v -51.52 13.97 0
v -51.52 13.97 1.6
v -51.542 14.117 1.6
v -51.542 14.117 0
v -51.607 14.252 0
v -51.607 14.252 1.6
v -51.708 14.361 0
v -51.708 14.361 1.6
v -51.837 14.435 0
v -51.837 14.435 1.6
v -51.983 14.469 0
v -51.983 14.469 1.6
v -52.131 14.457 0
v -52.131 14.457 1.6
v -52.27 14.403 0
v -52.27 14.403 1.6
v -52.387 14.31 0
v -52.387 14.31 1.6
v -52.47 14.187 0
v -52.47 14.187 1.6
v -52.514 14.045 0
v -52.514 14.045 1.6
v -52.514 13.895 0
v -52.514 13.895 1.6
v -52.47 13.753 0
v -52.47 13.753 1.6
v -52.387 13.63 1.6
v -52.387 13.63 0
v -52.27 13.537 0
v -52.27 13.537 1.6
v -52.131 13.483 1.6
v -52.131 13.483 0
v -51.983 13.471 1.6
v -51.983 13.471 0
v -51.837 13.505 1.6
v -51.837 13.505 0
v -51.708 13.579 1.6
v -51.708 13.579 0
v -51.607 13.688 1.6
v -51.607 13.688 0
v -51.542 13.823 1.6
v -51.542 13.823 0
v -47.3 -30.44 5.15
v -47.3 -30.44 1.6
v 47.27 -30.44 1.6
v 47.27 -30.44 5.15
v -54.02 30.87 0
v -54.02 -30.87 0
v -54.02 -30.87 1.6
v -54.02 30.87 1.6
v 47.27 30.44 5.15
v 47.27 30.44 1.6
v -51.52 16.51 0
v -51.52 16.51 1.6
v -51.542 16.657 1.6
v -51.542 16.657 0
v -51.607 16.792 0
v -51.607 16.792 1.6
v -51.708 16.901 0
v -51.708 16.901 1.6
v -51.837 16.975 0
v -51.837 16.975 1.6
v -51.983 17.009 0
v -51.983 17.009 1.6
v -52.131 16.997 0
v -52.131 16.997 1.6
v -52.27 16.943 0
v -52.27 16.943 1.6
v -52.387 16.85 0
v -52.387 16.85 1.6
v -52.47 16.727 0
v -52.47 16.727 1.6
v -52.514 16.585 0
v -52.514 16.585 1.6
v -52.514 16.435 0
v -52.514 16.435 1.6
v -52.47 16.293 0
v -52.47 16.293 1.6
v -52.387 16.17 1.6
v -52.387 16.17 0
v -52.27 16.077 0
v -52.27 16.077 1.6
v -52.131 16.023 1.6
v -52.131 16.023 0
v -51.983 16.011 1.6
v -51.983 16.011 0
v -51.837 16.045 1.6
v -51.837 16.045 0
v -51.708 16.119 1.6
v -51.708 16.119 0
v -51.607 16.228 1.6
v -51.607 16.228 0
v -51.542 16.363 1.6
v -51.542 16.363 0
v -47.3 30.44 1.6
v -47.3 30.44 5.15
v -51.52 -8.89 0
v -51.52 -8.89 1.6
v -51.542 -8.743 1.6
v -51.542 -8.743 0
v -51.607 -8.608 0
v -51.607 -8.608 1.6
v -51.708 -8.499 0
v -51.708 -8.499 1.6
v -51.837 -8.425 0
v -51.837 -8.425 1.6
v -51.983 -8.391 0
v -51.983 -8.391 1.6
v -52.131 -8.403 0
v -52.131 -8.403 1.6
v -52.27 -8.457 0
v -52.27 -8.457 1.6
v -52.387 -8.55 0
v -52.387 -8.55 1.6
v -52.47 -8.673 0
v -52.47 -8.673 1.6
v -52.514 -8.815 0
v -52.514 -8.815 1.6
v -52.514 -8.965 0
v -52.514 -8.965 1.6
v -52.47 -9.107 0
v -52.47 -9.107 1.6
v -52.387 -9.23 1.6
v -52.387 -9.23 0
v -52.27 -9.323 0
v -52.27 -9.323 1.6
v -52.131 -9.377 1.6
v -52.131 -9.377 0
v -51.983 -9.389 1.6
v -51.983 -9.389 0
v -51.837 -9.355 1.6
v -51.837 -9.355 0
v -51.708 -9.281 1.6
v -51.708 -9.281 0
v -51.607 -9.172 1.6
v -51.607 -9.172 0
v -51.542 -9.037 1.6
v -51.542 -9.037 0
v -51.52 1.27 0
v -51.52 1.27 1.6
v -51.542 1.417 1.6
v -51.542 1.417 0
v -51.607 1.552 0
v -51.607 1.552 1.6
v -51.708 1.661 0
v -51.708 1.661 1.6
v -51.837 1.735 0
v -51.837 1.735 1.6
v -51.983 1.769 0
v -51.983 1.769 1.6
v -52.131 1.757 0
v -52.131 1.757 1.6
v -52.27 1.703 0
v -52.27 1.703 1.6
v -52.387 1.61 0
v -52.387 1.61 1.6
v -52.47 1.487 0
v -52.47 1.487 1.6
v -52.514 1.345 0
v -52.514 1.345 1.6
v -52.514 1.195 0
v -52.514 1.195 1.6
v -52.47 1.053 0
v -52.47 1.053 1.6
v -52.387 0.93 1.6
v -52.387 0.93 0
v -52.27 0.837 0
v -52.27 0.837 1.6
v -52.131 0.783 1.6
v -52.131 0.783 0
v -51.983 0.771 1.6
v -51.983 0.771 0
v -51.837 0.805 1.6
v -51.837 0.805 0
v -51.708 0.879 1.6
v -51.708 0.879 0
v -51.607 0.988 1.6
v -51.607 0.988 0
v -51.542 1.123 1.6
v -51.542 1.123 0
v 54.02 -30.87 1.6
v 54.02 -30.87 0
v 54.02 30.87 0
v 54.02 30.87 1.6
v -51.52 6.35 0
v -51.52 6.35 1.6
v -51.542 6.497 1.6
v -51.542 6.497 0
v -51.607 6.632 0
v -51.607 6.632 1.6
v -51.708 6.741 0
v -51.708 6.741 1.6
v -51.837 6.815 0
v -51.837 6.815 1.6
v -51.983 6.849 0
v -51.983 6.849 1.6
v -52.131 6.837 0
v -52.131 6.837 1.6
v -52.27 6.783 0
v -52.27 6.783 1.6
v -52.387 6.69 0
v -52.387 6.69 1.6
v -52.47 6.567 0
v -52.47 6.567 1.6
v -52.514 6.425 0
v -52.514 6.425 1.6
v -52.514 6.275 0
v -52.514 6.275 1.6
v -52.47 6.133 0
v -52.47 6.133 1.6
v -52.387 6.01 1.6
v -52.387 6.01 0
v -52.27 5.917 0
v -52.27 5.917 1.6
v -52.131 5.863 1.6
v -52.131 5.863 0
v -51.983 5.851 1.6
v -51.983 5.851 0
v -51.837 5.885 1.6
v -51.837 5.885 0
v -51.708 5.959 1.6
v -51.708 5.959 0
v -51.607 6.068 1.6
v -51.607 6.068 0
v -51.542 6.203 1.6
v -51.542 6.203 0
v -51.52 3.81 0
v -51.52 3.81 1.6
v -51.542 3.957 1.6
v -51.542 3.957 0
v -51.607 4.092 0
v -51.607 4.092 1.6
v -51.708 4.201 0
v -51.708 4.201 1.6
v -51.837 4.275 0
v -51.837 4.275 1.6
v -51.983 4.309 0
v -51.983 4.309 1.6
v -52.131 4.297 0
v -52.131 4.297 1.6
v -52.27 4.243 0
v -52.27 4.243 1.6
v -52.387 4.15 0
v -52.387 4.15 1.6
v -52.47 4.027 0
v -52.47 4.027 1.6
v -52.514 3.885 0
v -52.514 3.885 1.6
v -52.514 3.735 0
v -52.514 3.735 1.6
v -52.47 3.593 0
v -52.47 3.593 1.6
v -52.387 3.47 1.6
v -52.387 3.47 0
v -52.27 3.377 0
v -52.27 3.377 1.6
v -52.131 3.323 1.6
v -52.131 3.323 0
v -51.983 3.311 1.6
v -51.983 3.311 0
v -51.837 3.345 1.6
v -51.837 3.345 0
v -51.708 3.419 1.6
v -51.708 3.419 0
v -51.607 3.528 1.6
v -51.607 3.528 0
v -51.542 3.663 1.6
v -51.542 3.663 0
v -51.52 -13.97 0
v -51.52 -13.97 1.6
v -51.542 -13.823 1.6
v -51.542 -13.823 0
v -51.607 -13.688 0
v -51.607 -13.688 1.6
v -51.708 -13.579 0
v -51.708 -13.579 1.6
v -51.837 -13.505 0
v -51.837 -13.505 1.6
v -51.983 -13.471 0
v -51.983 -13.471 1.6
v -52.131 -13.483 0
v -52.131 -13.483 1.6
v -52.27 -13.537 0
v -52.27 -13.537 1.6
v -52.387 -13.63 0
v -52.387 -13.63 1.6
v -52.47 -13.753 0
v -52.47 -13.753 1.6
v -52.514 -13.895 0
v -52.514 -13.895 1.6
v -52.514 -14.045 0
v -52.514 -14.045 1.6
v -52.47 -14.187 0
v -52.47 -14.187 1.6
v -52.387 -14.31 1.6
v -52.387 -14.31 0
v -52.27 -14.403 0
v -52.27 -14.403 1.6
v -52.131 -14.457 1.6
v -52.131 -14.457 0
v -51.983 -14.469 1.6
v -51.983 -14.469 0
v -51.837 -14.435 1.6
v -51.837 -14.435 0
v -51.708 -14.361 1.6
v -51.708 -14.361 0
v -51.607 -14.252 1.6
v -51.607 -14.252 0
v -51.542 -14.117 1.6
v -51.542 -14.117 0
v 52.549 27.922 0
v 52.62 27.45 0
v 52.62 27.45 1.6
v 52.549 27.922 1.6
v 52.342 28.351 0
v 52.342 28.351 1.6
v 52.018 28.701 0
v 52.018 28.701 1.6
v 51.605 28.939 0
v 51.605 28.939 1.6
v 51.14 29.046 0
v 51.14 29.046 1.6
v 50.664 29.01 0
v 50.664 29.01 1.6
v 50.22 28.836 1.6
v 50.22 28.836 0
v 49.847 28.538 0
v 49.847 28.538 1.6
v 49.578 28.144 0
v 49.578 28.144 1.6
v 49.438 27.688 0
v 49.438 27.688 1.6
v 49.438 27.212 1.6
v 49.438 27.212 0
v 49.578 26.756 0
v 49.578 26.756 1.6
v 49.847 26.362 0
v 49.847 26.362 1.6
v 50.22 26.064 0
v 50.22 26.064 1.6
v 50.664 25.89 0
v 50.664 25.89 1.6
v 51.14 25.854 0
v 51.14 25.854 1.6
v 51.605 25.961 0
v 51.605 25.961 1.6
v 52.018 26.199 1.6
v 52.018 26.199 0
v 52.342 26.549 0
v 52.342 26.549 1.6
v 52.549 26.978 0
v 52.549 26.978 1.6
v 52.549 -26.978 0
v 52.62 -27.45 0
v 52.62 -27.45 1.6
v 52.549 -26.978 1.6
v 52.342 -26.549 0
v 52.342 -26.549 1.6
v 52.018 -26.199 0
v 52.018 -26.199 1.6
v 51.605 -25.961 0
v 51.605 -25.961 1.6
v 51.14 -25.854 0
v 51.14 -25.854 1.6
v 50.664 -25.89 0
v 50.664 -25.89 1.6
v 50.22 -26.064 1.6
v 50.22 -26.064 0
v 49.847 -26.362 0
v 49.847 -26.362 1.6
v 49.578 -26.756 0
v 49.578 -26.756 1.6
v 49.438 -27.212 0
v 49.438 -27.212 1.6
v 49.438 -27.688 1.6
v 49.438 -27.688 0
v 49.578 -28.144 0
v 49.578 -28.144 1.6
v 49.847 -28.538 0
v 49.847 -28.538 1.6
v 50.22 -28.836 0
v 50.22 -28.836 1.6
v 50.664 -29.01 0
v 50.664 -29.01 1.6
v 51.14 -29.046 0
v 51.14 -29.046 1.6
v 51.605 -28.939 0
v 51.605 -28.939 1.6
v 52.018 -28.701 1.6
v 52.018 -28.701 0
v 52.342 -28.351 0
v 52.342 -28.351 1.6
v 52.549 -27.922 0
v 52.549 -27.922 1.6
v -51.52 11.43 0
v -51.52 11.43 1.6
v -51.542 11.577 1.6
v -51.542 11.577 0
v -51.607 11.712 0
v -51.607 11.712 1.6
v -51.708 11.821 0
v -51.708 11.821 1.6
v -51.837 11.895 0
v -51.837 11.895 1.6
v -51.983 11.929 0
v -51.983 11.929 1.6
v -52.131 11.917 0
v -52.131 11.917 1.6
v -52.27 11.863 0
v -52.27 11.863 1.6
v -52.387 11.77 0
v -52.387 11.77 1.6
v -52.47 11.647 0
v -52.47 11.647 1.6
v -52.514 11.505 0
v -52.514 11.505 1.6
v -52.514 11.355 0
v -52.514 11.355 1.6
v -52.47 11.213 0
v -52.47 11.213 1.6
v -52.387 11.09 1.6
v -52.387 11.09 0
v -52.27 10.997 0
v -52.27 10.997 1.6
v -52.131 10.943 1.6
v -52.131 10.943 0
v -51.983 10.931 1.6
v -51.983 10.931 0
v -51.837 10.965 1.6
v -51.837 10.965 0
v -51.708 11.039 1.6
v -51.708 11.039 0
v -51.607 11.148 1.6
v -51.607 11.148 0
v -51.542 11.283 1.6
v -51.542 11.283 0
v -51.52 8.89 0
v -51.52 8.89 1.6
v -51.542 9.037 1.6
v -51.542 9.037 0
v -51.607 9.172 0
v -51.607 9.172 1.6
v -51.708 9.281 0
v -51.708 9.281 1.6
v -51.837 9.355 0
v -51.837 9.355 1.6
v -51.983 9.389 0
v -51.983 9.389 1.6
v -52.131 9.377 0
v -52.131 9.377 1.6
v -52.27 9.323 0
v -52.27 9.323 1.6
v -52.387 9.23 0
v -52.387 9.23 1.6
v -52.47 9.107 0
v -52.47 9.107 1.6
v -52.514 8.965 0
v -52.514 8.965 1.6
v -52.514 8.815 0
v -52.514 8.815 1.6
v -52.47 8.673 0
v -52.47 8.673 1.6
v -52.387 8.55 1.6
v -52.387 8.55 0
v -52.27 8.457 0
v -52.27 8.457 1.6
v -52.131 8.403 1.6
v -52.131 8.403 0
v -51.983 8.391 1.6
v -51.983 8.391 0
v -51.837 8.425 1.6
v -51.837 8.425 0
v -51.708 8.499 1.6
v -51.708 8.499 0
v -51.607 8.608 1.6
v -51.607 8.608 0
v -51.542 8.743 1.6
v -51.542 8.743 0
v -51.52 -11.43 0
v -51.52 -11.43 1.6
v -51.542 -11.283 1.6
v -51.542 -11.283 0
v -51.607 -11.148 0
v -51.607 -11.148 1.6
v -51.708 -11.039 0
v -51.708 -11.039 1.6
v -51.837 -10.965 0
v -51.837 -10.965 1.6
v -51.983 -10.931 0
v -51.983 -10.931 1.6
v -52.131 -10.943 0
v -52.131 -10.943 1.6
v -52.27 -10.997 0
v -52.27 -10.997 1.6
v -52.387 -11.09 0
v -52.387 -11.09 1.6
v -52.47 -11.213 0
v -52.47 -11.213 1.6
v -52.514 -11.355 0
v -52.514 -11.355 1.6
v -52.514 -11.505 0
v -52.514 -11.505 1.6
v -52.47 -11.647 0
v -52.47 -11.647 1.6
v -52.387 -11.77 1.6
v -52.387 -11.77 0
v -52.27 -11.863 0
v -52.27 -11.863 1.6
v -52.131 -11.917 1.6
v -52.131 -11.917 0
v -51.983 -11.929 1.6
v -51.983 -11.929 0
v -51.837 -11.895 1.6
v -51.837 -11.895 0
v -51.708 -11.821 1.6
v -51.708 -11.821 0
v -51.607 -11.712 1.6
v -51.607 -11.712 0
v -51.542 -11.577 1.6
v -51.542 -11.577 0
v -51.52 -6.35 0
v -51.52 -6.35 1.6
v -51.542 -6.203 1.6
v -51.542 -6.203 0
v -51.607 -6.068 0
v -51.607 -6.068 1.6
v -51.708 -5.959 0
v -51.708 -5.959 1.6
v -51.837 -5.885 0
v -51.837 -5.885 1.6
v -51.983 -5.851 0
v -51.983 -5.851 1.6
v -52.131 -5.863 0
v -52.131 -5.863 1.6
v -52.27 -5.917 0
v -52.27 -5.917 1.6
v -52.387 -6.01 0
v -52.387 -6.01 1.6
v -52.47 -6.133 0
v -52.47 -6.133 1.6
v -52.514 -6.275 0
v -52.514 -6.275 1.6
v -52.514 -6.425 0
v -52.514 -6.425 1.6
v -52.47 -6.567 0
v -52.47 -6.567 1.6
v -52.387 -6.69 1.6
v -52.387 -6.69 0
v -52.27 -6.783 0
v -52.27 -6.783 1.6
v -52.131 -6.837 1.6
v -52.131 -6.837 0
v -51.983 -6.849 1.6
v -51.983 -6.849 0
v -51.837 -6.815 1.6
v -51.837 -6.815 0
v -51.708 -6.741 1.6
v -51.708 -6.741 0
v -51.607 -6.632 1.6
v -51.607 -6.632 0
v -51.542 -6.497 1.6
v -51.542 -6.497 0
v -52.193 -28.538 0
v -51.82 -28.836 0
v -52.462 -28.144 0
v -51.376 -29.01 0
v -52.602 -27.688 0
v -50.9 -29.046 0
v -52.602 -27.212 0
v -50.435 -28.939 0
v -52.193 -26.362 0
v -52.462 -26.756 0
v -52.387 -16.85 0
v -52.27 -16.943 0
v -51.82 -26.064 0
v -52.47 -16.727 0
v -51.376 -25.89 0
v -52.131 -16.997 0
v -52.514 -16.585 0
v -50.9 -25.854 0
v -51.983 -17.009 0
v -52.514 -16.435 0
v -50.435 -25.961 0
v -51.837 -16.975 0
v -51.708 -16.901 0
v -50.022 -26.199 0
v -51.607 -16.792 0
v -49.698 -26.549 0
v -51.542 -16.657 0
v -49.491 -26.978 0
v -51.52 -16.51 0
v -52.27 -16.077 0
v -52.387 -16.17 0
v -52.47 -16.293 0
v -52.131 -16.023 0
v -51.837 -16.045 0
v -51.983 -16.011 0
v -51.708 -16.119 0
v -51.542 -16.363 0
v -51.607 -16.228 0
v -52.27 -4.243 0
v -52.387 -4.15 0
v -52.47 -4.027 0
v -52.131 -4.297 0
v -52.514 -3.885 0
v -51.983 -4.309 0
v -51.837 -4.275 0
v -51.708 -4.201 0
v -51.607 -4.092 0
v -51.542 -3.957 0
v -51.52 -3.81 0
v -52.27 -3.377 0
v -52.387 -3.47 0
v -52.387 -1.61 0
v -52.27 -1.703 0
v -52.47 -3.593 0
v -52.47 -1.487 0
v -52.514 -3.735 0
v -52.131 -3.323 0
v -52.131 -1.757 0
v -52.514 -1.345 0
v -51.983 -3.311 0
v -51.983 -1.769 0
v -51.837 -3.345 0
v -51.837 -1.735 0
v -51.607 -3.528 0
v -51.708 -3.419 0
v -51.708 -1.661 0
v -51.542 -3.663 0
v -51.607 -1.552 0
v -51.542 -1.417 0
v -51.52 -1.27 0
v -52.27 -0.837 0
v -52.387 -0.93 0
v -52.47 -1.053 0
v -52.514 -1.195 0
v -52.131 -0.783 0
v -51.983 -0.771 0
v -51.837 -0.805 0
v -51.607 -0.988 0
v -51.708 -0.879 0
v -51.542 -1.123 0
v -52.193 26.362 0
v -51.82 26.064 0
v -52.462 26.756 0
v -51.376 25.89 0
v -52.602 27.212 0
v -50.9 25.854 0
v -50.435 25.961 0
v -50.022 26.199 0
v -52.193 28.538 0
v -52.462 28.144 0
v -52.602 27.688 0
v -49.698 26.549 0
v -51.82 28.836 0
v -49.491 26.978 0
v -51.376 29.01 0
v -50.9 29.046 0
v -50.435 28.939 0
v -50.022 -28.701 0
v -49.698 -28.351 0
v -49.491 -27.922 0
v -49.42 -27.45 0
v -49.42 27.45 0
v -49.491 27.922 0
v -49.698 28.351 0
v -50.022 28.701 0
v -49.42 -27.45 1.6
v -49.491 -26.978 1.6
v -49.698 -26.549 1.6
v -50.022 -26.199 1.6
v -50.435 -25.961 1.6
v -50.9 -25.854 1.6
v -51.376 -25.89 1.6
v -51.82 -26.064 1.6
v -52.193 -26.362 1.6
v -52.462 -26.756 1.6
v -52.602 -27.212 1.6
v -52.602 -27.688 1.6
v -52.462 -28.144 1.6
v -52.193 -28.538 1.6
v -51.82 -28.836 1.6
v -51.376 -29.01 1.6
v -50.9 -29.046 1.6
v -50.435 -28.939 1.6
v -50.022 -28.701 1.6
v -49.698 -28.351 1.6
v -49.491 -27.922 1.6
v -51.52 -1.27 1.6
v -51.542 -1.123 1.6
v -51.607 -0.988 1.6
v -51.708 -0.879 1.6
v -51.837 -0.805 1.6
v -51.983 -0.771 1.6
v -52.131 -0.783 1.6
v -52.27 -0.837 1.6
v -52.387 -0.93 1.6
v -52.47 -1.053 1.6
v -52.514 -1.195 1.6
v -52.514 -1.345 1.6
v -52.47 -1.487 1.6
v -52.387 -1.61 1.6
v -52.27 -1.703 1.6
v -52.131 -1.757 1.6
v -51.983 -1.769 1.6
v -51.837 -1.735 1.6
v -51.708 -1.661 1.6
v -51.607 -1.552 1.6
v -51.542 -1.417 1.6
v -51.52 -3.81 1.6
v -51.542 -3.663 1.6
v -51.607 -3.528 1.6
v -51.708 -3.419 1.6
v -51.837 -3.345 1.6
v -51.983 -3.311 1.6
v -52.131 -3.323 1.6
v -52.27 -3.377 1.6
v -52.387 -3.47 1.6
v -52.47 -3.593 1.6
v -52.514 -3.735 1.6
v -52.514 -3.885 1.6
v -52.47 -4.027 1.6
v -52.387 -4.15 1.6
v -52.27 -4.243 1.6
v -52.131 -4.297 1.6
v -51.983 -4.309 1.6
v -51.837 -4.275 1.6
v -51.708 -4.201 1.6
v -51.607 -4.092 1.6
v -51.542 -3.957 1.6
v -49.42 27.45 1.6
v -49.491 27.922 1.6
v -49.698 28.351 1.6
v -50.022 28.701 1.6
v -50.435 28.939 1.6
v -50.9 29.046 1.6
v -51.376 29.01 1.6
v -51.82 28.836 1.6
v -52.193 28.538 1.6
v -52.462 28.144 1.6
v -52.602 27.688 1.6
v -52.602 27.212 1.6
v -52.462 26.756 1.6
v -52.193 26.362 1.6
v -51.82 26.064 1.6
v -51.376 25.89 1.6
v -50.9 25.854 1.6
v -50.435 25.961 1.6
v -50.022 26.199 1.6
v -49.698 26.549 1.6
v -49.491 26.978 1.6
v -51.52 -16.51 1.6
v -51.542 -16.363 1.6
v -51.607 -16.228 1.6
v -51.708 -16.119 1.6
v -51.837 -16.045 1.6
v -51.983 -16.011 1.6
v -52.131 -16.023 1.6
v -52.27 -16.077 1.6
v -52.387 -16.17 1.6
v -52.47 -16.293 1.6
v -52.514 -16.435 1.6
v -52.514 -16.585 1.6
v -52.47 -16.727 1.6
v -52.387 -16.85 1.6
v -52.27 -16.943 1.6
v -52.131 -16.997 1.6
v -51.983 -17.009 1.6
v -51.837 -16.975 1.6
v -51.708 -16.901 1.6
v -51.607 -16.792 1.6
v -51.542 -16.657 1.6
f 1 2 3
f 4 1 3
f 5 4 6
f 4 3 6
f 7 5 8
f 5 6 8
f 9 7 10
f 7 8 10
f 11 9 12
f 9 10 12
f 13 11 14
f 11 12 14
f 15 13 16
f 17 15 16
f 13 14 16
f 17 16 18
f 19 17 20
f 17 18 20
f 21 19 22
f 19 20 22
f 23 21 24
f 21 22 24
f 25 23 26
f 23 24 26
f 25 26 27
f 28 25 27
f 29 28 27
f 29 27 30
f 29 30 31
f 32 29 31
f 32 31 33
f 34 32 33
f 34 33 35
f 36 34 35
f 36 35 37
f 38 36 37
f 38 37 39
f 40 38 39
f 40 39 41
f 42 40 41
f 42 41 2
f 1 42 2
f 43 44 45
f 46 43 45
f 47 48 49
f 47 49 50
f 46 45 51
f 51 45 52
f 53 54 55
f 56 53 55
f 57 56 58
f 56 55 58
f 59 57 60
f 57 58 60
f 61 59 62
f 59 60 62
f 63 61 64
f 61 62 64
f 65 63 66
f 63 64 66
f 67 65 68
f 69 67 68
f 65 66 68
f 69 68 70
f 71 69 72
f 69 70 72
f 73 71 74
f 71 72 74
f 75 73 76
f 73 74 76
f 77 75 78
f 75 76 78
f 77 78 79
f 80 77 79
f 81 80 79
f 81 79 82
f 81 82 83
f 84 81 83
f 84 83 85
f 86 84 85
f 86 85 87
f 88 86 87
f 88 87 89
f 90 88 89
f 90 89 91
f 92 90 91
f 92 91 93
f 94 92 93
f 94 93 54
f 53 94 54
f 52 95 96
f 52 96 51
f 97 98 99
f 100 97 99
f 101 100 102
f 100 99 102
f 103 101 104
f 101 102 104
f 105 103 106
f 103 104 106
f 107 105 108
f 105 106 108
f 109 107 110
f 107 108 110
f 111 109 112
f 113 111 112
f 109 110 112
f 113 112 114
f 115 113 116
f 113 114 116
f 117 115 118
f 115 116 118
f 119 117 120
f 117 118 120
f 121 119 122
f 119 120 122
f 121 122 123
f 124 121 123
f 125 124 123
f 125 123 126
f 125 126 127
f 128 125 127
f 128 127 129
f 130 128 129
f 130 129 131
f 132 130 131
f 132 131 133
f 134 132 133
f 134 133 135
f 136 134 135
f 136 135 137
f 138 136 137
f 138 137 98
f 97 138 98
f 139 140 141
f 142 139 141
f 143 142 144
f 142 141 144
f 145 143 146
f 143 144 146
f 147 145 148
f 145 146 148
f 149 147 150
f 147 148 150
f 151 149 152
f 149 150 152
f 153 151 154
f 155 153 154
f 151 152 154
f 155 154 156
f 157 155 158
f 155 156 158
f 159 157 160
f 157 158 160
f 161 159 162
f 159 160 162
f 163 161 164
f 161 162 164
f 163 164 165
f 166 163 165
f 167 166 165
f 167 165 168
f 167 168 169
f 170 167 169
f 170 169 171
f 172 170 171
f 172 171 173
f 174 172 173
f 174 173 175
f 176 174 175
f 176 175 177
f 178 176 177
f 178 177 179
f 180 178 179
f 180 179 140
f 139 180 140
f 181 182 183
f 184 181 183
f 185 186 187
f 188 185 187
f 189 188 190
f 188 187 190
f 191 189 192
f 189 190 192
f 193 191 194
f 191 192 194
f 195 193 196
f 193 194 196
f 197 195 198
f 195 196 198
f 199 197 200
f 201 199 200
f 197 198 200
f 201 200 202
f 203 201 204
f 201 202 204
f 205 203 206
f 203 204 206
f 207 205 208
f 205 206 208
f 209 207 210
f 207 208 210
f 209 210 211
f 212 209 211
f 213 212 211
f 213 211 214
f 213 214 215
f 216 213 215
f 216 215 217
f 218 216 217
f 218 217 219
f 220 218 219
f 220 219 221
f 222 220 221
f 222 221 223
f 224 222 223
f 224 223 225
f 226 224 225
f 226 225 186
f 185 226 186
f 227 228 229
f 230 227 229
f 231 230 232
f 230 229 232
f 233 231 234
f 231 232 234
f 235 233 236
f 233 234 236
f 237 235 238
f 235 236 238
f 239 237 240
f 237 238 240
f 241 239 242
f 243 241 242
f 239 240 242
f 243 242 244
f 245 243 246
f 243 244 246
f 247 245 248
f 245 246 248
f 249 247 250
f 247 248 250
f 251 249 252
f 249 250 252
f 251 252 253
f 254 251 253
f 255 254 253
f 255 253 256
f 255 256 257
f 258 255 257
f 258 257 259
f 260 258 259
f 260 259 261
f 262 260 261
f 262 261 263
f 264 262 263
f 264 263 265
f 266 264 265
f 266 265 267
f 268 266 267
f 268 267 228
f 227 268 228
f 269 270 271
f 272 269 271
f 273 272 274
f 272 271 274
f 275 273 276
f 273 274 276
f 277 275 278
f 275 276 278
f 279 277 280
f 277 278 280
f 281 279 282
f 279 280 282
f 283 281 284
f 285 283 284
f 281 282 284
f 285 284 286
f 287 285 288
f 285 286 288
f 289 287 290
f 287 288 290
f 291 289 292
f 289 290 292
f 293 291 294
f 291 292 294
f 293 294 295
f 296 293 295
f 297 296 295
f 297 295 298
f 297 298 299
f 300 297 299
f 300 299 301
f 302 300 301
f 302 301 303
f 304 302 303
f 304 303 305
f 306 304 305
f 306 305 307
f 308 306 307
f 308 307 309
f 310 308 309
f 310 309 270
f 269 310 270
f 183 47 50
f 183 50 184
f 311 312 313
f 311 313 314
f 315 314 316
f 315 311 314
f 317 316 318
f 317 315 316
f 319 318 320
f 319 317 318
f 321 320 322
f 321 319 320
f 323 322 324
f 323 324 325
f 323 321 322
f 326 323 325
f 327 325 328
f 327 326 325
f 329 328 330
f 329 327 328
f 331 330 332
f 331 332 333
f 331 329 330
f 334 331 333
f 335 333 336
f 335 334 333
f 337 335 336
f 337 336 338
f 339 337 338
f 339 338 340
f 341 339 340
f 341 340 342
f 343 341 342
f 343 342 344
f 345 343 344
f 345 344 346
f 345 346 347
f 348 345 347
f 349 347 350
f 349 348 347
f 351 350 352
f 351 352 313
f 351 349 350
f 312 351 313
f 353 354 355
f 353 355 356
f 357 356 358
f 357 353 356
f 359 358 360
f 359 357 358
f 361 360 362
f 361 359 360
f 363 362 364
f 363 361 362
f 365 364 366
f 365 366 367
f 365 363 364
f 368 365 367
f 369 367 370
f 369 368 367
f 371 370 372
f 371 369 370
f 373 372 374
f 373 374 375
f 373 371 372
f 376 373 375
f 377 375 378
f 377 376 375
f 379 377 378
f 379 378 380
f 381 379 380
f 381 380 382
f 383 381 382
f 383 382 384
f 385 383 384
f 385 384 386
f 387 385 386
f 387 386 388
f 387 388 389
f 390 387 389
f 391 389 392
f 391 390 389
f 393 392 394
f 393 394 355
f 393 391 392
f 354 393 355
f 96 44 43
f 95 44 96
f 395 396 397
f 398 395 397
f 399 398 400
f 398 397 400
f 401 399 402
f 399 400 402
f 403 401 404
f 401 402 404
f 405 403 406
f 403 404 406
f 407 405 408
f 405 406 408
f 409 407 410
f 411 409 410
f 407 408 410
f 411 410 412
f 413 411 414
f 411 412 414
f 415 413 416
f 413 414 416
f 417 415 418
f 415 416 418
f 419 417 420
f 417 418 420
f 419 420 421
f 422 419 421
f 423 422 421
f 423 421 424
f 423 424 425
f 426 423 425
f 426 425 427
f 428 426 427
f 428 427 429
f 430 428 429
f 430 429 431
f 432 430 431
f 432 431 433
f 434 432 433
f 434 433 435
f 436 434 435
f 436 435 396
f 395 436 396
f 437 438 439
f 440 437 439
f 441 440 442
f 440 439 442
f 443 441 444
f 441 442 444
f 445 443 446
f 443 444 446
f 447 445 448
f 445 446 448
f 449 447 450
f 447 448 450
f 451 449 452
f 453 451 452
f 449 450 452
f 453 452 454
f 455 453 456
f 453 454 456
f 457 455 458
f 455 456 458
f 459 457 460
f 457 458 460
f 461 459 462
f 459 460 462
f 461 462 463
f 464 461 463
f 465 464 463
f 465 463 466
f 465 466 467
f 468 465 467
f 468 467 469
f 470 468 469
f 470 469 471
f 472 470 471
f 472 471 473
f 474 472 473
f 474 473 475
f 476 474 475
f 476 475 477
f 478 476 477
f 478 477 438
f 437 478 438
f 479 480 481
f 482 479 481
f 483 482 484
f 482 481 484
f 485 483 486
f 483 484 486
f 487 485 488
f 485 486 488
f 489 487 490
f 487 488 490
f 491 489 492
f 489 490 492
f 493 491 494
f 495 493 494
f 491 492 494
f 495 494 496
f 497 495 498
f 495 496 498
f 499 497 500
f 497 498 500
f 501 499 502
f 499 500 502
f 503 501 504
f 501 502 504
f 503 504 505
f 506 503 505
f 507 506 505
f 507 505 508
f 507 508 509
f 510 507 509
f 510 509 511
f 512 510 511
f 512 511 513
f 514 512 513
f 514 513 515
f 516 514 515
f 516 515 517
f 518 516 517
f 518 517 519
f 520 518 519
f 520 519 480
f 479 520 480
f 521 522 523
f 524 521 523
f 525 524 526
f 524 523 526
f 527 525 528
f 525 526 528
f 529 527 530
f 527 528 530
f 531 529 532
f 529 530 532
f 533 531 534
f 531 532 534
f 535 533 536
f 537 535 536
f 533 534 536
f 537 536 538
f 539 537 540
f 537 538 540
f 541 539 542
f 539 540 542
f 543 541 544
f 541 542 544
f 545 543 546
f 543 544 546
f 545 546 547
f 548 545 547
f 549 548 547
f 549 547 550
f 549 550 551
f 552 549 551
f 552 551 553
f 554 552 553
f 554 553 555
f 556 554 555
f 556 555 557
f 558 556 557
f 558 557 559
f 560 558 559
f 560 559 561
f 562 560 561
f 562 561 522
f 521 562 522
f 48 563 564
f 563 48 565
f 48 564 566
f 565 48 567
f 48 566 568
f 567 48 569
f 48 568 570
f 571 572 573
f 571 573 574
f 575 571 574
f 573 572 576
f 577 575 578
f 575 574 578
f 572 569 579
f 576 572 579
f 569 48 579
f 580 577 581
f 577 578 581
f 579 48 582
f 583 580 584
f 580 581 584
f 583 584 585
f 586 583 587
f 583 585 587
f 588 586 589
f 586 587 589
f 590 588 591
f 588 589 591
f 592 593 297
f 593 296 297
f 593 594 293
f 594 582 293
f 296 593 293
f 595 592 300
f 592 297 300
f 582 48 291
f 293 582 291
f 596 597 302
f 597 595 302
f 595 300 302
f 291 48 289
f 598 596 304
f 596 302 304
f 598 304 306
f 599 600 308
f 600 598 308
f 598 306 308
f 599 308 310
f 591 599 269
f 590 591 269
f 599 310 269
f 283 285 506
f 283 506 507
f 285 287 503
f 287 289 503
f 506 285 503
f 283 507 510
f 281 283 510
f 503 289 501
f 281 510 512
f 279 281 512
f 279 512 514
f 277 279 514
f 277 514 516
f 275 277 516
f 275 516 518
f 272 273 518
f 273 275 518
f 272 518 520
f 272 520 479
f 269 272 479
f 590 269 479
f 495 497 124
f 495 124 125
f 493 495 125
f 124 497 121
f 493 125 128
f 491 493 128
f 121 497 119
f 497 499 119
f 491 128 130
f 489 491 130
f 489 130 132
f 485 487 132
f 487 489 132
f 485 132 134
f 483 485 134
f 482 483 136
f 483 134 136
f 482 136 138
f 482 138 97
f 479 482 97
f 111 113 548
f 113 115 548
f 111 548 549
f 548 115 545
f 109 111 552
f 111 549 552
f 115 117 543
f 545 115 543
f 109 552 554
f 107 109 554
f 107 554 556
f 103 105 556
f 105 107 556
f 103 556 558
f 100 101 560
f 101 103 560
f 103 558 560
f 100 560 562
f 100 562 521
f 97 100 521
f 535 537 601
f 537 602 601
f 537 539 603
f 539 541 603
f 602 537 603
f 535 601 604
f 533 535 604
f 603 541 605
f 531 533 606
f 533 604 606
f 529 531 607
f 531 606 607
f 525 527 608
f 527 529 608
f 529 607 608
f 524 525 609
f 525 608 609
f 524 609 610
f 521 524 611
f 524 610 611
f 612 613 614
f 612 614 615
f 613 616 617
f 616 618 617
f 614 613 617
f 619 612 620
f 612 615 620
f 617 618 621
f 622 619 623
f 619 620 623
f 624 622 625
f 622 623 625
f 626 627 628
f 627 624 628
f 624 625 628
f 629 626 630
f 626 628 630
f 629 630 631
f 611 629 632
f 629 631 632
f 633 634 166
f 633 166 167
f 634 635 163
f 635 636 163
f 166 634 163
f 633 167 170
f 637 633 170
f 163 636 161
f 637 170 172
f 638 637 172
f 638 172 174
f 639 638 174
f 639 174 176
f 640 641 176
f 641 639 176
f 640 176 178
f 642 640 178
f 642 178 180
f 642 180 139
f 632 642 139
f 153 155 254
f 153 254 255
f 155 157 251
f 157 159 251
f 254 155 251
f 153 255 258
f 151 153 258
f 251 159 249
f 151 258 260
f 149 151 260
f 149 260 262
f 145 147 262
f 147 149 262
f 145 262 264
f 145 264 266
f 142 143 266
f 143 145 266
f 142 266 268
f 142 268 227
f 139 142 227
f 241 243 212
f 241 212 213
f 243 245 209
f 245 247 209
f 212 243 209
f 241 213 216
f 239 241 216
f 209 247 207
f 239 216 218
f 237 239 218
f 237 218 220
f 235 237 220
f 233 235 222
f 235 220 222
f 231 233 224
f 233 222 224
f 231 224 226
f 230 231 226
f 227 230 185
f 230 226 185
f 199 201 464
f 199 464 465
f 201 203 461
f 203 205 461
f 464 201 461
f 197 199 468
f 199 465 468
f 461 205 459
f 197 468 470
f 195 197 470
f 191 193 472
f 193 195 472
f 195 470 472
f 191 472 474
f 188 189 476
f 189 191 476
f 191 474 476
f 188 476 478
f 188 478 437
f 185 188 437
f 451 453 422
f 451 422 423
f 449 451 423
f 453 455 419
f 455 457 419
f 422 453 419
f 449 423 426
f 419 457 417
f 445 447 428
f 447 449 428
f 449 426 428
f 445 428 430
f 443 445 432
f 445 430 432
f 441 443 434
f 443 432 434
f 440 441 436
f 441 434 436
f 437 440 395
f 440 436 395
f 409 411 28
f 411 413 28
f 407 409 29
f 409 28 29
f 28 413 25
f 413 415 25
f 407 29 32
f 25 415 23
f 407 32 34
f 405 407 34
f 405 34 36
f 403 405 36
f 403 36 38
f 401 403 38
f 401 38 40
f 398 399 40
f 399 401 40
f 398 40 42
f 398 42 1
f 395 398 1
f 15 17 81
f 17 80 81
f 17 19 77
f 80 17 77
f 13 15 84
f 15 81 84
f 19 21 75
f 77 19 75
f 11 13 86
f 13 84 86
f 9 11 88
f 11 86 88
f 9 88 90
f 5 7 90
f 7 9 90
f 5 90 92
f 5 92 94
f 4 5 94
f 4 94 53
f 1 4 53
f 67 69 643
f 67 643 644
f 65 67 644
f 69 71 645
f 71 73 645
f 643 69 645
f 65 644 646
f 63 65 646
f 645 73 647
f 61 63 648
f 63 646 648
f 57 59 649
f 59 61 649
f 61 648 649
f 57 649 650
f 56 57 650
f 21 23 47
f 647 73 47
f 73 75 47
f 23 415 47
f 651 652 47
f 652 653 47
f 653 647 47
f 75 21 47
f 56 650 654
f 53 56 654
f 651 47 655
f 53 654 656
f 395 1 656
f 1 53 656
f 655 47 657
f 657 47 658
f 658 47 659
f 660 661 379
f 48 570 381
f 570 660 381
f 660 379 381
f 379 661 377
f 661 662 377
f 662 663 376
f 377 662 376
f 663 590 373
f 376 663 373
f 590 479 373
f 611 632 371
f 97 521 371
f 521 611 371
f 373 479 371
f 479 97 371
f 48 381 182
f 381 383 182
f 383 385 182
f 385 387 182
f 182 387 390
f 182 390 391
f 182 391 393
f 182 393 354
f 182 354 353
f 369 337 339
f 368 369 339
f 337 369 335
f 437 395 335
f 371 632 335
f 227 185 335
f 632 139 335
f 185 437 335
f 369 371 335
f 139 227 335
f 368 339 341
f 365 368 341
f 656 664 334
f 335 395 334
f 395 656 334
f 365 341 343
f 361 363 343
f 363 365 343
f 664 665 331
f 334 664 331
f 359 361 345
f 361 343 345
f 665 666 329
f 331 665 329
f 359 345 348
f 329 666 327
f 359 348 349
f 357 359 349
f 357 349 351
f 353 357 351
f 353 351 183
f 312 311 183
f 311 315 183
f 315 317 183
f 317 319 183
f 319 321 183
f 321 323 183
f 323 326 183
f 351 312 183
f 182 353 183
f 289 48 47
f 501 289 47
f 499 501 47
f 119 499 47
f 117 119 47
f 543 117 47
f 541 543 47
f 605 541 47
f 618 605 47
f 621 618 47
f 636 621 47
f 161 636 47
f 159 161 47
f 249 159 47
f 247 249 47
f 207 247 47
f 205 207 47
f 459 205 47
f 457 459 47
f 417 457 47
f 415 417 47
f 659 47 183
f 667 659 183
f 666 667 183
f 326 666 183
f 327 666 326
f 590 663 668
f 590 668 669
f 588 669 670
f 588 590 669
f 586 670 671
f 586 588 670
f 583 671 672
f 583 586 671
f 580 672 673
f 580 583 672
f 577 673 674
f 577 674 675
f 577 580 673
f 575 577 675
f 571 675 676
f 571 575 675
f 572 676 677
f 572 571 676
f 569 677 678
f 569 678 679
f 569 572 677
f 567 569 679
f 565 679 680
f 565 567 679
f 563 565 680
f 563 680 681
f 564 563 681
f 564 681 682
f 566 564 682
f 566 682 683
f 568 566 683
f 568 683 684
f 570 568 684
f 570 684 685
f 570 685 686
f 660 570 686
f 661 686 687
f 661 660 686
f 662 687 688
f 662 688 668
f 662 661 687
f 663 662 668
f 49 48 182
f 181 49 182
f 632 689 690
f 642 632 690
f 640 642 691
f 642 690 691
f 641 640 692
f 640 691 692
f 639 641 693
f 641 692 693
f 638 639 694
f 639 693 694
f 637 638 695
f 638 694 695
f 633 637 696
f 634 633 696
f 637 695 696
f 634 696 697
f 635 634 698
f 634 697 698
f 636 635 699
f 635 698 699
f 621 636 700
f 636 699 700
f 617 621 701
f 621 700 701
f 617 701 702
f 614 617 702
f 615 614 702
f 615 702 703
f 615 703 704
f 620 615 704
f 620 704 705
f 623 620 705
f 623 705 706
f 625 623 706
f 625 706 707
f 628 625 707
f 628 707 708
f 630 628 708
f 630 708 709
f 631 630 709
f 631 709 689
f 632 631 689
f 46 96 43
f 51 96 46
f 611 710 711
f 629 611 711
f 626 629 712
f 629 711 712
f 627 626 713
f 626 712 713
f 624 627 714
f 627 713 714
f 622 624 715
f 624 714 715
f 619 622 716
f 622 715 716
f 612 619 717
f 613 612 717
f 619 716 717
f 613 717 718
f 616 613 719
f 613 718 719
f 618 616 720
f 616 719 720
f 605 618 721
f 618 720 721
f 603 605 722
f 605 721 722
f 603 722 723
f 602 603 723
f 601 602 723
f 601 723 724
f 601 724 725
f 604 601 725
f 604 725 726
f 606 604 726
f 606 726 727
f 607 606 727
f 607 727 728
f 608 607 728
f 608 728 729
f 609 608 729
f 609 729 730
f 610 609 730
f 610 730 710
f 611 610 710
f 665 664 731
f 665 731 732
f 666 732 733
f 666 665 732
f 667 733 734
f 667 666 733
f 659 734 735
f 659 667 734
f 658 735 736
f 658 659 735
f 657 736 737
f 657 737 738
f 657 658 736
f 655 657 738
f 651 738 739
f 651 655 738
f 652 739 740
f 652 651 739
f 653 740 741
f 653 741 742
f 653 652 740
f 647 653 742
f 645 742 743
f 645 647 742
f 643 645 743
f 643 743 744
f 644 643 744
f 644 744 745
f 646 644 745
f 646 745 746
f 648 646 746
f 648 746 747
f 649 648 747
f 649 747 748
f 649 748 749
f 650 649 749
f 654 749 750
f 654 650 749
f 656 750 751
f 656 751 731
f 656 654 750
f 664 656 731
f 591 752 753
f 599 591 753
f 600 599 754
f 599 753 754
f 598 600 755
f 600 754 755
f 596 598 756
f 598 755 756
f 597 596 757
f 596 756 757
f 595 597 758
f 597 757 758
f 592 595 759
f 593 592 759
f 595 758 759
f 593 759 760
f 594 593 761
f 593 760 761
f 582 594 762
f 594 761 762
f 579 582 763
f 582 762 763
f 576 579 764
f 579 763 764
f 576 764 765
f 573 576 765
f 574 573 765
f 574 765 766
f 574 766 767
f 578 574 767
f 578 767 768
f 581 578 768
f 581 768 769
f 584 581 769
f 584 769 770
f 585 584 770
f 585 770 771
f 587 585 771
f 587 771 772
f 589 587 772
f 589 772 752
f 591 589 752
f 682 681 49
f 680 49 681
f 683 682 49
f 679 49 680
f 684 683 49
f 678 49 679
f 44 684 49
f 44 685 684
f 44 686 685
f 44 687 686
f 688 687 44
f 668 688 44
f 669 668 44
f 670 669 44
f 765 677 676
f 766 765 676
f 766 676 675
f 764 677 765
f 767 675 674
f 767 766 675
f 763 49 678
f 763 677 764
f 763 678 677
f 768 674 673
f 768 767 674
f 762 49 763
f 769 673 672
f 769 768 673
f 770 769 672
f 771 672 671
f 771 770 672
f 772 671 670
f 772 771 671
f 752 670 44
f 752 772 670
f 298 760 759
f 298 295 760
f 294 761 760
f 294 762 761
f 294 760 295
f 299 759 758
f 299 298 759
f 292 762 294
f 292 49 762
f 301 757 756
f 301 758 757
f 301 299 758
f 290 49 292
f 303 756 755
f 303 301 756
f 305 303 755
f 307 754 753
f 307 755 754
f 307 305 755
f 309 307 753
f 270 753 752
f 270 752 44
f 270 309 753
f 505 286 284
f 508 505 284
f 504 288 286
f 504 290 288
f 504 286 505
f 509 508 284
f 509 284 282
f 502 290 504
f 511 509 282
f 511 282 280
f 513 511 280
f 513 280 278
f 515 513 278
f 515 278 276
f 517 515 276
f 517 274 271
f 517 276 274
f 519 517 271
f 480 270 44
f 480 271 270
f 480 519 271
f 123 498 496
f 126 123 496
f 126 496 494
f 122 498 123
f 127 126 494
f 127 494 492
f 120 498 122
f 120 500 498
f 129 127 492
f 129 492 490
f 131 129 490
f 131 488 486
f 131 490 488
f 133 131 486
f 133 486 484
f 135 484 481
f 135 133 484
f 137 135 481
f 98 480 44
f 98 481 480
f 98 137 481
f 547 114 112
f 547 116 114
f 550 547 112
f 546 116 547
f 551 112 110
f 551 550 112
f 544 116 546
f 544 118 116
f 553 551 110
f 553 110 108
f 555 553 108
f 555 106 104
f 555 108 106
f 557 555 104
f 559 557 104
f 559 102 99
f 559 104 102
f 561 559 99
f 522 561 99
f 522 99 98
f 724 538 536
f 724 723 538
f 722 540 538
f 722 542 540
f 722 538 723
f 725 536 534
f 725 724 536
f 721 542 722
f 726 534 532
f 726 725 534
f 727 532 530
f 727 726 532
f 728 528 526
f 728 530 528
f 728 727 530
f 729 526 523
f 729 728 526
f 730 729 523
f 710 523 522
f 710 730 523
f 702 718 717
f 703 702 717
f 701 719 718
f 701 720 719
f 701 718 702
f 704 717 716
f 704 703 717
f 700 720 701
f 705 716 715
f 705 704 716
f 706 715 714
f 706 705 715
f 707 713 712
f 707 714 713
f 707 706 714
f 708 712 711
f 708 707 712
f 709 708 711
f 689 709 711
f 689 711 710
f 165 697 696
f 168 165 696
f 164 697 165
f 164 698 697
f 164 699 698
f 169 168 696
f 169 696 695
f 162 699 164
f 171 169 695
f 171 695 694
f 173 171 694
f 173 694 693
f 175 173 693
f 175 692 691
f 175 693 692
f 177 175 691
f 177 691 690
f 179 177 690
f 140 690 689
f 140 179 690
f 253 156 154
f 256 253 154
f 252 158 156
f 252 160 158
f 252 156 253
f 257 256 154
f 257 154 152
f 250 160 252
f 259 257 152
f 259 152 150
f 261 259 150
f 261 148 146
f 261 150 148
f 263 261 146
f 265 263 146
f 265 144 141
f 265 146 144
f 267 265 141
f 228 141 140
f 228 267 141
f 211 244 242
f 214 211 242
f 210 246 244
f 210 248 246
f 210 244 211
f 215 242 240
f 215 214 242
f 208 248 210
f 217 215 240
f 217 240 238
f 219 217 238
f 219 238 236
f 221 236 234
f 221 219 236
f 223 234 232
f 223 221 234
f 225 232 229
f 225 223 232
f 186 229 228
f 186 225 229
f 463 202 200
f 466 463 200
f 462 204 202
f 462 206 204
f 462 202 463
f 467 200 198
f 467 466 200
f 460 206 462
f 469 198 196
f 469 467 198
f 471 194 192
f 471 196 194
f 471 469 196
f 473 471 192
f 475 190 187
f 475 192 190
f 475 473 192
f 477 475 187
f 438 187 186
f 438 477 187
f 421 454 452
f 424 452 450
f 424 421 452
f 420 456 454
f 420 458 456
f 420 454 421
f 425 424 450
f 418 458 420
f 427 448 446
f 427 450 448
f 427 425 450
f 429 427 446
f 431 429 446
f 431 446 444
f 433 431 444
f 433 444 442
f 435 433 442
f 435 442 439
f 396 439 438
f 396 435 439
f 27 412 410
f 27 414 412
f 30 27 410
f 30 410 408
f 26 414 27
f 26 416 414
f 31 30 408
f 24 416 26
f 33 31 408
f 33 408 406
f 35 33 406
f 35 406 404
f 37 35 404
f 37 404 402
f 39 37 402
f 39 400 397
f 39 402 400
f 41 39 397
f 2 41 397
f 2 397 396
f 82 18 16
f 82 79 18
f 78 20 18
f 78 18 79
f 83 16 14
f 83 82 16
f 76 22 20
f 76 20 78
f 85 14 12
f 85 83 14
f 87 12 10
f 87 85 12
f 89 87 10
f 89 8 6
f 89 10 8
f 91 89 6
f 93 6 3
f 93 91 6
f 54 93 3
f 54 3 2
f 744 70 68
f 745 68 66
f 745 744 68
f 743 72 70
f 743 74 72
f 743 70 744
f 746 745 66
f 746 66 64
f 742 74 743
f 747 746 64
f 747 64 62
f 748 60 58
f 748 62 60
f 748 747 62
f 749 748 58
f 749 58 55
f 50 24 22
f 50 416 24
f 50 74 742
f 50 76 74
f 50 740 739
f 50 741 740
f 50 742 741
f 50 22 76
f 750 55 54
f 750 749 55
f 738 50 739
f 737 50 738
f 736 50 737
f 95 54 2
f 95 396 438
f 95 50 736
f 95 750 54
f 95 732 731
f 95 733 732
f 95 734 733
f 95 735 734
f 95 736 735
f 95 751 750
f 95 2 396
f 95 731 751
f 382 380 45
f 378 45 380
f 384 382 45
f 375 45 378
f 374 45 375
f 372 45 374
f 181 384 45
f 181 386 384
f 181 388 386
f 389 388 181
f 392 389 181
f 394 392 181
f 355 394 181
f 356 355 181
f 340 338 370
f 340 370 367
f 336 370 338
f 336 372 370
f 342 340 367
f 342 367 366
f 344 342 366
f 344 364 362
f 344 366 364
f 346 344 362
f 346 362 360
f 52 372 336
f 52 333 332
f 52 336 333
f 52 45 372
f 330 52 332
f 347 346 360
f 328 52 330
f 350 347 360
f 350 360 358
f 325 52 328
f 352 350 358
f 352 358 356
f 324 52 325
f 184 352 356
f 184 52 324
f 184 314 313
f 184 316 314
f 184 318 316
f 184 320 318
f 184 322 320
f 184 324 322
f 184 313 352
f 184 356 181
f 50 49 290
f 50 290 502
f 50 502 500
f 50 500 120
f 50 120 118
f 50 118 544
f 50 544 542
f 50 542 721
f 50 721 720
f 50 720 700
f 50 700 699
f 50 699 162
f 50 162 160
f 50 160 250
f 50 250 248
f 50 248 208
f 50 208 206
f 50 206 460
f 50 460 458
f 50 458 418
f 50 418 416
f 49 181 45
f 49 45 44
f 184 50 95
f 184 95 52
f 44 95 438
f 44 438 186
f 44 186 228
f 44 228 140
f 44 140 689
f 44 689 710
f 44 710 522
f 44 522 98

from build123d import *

# Parameters (mm, degrees)
SKETCH1_W           = 108.04
SKETCH1_H           = 61.74
SKETCH1_R           = 1.6
BOSS_EXTRUDE1_DEPTH = 1.6
SKETCH2_W           = 94.57
SKETCH2_H           = 60.88
BOSS_EXTRUDE2_DEPTH = 3.55
SKETCH3_R           = 0.5
CUT_EXTRUDE1_DEPTH  = 3.55


with BuildPart() as part:
    # Sketch1 → Boss-Extrude1 (new body)
    with BuildSketch(Plane.XY):
        Rectangle(SKETCH1_W, SKETCH1_H)
        with Locations((-51.02, 27.45)):
            Circle(SKETCH1_R, mode=Mode.SUBTRACT)
        with Locations((-51.02, -27.45)):
            Circle(SKETCH1_R, mode=Mode.SUBTRACT)
        with Locations((51.02, -27.45)):
            Circle(SKETCH1_R, mode=Mode.SUBTRACT)
        with Locations((51.02, 27.45)):
            Circle(SKETCH1_R, mode=Mode.SUBTRACT)
    extrude(amount=BOSS_EXTRUDE1_DEPTH)

    # Sketch2 → Boss-Extrude2 (add)
    with BuildSketch(Plane.XY.offset(1.6)):
        with Locations((-0.015, 0)):
            Rectangle(SKETCH2_W, SKETCH2_H)
    extrude(amount=BOSS_EXTRUDE2_DEPTH)

    # Sketch3 → Cut-Extrude1 (cut)
    with BuildSketch(Plane.XY.offset(1.6)):
        with Locations((-52.02, 16.51)):
            Circle(SKETCH3_R)
        with Locations((-52.02, 13.97)):
            Circle(SKETCH3_R)
        with Locations((-52.02, 11.43)):
            Circle(SKETCH3_R)
        with Locations((-52.02, 8.89)):
            Circle(SKETCH3_R)
        with Locations((-52.02, 6.35)):
            Circle(SKETCH3_R)
        with Locations((-52.02, 3.81)):
            Circle(SKETCH3_R)
        with Locations((-52.02, 1.27)):
            Circle(SKETCH3_R)
        with Locations((-52.02, -1.27)):
            Circle(SKETCH3_R)
        with Locations((-52.02, -3.81)):
            Circle(SKETCH3_R)
        with Locations((-52.02, -6.35)):
            Circle(SKETCH3_R)
        with Locations((-52.02, -8.89)):
            Circle(SKETCH3_R)
        with Locations((-52.02, -11.43)):
            Circle(SKETCH3_R)
        with Locations((-52.02, -13.97)):
            Circle(SKETCH3_R)
        with Locations((-52.02, -16.51)):
            Circle(SKETCH3_R)
    extrude(amount=-CUT_EXTRUDE1_DEPTH, mode=Mode.SUBTRACT)


solid = part.part
